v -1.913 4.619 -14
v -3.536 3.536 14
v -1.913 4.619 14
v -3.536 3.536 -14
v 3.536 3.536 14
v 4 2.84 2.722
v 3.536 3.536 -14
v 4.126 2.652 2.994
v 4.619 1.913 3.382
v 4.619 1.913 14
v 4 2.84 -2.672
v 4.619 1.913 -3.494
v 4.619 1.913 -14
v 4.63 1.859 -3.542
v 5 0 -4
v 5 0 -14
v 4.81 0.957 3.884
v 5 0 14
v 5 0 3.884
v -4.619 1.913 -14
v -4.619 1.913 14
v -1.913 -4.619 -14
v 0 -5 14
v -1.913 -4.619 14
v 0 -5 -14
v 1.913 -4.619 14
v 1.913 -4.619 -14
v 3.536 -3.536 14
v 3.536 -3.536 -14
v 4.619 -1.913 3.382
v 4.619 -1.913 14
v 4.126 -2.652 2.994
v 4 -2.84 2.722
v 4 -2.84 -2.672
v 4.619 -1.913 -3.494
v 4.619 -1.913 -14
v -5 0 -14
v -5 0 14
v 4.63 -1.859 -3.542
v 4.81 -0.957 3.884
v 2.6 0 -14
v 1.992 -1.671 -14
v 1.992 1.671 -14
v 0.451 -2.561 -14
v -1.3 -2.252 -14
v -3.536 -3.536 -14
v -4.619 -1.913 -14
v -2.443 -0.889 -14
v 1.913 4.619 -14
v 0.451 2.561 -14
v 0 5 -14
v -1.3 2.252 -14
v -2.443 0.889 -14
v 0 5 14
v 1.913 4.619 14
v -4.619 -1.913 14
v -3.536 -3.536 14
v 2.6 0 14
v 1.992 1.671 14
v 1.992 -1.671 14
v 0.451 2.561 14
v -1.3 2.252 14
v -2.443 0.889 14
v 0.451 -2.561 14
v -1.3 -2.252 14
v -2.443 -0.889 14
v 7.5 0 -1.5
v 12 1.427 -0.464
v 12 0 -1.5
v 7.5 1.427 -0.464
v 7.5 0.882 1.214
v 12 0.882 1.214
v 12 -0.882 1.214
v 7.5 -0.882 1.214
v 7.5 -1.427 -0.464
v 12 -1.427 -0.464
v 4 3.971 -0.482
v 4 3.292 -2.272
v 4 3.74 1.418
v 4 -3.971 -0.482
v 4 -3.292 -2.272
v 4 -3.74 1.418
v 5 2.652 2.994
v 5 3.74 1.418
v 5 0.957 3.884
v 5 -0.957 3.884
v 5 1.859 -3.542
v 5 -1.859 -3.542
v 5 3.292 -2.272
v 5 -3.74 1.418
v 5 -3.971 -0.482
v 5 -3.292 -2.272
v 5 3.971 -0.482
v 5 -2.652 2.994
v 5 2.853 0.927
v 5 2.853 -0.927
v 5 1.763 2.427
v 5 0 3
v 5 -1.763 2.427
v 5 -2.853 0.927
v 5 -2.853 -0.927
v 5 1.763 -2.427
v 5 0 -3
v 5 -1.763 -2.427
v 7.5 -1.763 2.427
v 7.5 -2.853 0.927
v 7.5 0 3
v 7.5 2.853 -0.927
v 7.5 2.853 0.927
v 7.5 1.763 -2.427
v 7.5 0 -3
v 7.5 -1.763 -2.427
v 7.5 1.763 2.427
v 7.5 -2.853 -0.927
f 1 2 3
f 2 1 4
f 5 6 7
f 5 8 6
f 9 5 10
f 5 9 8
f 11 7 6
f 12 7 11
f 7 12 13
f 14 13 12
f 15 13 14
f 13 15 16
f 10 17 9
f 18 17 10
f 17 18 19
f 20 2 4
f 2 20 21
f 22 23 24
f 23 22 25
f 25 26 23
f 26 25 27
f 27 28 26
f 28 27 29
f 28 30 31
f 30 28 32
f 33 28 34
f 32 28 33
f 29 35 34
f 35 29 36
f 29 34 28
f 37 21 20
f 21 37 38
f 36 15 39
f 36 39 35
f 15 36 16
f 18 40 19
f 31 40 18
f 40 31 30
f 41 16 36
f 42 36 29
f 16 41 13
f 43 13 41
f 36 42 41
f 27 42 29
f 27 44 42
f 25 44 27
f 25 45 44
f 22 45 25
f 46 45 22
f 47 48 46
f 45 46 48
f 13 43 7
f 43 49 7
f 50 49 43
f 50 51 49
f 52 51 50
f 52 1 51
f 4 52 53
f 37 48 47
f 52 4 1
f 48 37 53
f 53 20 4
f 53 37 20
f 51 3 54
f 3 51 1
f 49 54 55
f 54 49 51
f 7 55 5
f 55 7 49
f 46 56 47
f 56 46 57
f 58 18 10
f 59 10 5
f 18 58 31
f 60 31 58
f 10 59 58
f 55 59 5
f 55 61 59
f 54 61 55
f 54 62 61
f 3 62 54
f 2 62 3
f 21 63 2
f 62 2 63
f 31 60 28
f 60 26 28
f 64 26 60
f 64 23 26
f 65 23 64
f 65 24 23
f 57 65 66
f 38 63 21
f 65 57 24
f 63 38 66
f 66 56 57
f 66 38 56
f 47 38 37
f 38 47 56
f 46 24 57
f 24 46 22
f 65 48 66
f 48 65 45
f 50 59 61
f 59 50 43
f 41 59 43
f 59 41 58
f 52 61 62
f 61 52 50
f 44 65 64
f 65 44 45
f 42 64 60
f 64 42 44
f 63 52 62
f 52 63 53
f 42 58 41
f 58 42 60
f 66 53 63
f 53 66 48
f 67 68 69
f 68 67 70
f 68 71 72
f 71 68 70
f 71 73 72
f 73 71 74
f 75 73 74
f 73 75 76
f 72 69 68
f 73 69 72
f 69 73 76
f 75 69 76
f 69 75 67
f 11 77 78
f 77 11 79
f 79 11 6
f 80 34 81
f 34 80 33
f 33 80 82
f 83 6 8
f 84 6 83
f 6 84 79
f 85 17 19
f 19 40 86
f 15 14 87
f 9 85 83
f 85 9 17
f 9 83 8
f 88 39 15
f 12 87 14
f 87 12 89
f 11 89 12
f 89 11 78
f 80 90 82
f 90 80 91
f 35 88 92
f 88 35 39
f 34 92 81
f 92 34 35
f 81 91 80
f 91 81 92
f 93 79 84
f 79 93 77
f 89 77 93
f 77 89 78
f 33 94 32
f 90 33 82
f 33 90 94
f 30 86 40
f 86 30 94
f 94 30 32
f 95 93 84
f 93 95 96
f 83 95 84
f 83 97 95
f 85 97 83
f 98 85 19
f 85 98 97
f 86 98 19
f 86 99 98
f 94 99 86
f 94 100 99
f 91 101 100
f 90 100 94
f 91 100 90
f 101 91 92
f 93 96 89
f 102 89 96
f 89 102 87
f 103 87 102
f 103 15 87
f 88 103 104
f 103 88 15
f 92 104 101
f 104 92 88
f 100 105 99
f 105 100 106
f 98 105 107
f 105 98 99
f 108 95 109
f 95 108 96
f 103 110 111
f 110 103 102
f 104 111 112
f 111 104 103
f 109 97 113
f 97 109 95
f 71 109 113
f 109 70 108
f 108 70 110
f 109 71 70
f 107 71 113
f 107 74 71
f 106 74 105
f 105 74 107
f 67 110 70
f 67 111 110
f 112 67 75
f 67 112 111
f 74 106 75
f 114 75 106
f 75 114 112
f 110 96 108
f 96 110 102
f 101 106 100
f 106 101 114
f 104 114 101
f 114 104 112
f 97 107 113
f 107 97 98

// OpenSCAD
// Parameters
bore_diameter_mm = 5; //[2.5:10:0.1]
outer_diameter_mm = 10; //[5:20:0.1]
length_mm = 28; //[14:56:0.5]
wall_thickness_mm = 2.5; //[1.25:5:0.1]
fit_clearance_mm = 0.2; //[0.05:0.5:0.05]
overlap_mm = 1; //[0.5:2:0.1]
screw_shank_diameter_mm = 3; //[2:6:0.1]
screw_length_mm = 8; //[4:16:0.5]
screw_head_diameter_mm = 6; //[4:12:0.1]
screw_head_height_mm = 2.5; //[1.5:5:0.1]
washer_outer_diameter_mm = 8; //[5:16:0.1]
washer_thickness_mm = 1; //[0.5:2.5:0.1]

// Derived radii
bearing_r = outer_diameter_mm/2;
bore_r    = (bore_diameter_mm + fit_clearance_mm)/2;

// Linear Bearing - complete geometry (the required missing part)
module linear_bearing() {
  color([0.85, 0.85, 0.8])
  difference() {
    // Outer casing
    cylinder(h=length_mm, r=bearing_r, center=true);
    // Inner bore (slightly longer to ensure clean cut)
    cylinder(h=length_mm + 2*overlap_mm, r=bore_r, center=true);
  }
}

// Screw and Washer - attached to the bearing with guaranteed overlap
module screw_and_washer_attached() {
  // Attach along +X, with 1-2mm overlap into the bearing OD
  // Place the shank so its inner end penetrates the bearing by overlap_mm.
  shank_center_x = bearing_r + screw_length_mm/2 - overlap_mm;

  // Place washer and head further out from the bearing, still on the same axis.
  washer_center_x = bearing_r + washer_thickness_mm/2 - overlap_mm;
  head_center_x   = bearing_r + washer_thickness_mm + screw_head_height_mm/2 - overlap_mm;

  color("DimGray")
  union() {
    // Screw shank
    translate([shank_center_x, 0, 0])
      rotate([0, 90, 0])
      cylinder(h=screw_length_mm, r=screw_shank_diameter_mm/2, center=true);

    // Washer (between head and bearing)
    translate([washer_center_x, 0, 0])
      rotate([0, 90, 0])
      cylinder(h=washer_thickness_mm, r=washer_outer_diameter_mm/2, center=true);

    // Screw head
    translate([head_center_x, 0, 0])
      rotate([0, 90, 0])
      cylinder(h=screw_head_height_mm, r=screw_head_diameter_mm/2, center=true);
  }
}

// Assembly: single connected solid
module assembly() {
  union() {
    linear_bearing();
    screw_and_washer_attached();
  }
}

assembly();
